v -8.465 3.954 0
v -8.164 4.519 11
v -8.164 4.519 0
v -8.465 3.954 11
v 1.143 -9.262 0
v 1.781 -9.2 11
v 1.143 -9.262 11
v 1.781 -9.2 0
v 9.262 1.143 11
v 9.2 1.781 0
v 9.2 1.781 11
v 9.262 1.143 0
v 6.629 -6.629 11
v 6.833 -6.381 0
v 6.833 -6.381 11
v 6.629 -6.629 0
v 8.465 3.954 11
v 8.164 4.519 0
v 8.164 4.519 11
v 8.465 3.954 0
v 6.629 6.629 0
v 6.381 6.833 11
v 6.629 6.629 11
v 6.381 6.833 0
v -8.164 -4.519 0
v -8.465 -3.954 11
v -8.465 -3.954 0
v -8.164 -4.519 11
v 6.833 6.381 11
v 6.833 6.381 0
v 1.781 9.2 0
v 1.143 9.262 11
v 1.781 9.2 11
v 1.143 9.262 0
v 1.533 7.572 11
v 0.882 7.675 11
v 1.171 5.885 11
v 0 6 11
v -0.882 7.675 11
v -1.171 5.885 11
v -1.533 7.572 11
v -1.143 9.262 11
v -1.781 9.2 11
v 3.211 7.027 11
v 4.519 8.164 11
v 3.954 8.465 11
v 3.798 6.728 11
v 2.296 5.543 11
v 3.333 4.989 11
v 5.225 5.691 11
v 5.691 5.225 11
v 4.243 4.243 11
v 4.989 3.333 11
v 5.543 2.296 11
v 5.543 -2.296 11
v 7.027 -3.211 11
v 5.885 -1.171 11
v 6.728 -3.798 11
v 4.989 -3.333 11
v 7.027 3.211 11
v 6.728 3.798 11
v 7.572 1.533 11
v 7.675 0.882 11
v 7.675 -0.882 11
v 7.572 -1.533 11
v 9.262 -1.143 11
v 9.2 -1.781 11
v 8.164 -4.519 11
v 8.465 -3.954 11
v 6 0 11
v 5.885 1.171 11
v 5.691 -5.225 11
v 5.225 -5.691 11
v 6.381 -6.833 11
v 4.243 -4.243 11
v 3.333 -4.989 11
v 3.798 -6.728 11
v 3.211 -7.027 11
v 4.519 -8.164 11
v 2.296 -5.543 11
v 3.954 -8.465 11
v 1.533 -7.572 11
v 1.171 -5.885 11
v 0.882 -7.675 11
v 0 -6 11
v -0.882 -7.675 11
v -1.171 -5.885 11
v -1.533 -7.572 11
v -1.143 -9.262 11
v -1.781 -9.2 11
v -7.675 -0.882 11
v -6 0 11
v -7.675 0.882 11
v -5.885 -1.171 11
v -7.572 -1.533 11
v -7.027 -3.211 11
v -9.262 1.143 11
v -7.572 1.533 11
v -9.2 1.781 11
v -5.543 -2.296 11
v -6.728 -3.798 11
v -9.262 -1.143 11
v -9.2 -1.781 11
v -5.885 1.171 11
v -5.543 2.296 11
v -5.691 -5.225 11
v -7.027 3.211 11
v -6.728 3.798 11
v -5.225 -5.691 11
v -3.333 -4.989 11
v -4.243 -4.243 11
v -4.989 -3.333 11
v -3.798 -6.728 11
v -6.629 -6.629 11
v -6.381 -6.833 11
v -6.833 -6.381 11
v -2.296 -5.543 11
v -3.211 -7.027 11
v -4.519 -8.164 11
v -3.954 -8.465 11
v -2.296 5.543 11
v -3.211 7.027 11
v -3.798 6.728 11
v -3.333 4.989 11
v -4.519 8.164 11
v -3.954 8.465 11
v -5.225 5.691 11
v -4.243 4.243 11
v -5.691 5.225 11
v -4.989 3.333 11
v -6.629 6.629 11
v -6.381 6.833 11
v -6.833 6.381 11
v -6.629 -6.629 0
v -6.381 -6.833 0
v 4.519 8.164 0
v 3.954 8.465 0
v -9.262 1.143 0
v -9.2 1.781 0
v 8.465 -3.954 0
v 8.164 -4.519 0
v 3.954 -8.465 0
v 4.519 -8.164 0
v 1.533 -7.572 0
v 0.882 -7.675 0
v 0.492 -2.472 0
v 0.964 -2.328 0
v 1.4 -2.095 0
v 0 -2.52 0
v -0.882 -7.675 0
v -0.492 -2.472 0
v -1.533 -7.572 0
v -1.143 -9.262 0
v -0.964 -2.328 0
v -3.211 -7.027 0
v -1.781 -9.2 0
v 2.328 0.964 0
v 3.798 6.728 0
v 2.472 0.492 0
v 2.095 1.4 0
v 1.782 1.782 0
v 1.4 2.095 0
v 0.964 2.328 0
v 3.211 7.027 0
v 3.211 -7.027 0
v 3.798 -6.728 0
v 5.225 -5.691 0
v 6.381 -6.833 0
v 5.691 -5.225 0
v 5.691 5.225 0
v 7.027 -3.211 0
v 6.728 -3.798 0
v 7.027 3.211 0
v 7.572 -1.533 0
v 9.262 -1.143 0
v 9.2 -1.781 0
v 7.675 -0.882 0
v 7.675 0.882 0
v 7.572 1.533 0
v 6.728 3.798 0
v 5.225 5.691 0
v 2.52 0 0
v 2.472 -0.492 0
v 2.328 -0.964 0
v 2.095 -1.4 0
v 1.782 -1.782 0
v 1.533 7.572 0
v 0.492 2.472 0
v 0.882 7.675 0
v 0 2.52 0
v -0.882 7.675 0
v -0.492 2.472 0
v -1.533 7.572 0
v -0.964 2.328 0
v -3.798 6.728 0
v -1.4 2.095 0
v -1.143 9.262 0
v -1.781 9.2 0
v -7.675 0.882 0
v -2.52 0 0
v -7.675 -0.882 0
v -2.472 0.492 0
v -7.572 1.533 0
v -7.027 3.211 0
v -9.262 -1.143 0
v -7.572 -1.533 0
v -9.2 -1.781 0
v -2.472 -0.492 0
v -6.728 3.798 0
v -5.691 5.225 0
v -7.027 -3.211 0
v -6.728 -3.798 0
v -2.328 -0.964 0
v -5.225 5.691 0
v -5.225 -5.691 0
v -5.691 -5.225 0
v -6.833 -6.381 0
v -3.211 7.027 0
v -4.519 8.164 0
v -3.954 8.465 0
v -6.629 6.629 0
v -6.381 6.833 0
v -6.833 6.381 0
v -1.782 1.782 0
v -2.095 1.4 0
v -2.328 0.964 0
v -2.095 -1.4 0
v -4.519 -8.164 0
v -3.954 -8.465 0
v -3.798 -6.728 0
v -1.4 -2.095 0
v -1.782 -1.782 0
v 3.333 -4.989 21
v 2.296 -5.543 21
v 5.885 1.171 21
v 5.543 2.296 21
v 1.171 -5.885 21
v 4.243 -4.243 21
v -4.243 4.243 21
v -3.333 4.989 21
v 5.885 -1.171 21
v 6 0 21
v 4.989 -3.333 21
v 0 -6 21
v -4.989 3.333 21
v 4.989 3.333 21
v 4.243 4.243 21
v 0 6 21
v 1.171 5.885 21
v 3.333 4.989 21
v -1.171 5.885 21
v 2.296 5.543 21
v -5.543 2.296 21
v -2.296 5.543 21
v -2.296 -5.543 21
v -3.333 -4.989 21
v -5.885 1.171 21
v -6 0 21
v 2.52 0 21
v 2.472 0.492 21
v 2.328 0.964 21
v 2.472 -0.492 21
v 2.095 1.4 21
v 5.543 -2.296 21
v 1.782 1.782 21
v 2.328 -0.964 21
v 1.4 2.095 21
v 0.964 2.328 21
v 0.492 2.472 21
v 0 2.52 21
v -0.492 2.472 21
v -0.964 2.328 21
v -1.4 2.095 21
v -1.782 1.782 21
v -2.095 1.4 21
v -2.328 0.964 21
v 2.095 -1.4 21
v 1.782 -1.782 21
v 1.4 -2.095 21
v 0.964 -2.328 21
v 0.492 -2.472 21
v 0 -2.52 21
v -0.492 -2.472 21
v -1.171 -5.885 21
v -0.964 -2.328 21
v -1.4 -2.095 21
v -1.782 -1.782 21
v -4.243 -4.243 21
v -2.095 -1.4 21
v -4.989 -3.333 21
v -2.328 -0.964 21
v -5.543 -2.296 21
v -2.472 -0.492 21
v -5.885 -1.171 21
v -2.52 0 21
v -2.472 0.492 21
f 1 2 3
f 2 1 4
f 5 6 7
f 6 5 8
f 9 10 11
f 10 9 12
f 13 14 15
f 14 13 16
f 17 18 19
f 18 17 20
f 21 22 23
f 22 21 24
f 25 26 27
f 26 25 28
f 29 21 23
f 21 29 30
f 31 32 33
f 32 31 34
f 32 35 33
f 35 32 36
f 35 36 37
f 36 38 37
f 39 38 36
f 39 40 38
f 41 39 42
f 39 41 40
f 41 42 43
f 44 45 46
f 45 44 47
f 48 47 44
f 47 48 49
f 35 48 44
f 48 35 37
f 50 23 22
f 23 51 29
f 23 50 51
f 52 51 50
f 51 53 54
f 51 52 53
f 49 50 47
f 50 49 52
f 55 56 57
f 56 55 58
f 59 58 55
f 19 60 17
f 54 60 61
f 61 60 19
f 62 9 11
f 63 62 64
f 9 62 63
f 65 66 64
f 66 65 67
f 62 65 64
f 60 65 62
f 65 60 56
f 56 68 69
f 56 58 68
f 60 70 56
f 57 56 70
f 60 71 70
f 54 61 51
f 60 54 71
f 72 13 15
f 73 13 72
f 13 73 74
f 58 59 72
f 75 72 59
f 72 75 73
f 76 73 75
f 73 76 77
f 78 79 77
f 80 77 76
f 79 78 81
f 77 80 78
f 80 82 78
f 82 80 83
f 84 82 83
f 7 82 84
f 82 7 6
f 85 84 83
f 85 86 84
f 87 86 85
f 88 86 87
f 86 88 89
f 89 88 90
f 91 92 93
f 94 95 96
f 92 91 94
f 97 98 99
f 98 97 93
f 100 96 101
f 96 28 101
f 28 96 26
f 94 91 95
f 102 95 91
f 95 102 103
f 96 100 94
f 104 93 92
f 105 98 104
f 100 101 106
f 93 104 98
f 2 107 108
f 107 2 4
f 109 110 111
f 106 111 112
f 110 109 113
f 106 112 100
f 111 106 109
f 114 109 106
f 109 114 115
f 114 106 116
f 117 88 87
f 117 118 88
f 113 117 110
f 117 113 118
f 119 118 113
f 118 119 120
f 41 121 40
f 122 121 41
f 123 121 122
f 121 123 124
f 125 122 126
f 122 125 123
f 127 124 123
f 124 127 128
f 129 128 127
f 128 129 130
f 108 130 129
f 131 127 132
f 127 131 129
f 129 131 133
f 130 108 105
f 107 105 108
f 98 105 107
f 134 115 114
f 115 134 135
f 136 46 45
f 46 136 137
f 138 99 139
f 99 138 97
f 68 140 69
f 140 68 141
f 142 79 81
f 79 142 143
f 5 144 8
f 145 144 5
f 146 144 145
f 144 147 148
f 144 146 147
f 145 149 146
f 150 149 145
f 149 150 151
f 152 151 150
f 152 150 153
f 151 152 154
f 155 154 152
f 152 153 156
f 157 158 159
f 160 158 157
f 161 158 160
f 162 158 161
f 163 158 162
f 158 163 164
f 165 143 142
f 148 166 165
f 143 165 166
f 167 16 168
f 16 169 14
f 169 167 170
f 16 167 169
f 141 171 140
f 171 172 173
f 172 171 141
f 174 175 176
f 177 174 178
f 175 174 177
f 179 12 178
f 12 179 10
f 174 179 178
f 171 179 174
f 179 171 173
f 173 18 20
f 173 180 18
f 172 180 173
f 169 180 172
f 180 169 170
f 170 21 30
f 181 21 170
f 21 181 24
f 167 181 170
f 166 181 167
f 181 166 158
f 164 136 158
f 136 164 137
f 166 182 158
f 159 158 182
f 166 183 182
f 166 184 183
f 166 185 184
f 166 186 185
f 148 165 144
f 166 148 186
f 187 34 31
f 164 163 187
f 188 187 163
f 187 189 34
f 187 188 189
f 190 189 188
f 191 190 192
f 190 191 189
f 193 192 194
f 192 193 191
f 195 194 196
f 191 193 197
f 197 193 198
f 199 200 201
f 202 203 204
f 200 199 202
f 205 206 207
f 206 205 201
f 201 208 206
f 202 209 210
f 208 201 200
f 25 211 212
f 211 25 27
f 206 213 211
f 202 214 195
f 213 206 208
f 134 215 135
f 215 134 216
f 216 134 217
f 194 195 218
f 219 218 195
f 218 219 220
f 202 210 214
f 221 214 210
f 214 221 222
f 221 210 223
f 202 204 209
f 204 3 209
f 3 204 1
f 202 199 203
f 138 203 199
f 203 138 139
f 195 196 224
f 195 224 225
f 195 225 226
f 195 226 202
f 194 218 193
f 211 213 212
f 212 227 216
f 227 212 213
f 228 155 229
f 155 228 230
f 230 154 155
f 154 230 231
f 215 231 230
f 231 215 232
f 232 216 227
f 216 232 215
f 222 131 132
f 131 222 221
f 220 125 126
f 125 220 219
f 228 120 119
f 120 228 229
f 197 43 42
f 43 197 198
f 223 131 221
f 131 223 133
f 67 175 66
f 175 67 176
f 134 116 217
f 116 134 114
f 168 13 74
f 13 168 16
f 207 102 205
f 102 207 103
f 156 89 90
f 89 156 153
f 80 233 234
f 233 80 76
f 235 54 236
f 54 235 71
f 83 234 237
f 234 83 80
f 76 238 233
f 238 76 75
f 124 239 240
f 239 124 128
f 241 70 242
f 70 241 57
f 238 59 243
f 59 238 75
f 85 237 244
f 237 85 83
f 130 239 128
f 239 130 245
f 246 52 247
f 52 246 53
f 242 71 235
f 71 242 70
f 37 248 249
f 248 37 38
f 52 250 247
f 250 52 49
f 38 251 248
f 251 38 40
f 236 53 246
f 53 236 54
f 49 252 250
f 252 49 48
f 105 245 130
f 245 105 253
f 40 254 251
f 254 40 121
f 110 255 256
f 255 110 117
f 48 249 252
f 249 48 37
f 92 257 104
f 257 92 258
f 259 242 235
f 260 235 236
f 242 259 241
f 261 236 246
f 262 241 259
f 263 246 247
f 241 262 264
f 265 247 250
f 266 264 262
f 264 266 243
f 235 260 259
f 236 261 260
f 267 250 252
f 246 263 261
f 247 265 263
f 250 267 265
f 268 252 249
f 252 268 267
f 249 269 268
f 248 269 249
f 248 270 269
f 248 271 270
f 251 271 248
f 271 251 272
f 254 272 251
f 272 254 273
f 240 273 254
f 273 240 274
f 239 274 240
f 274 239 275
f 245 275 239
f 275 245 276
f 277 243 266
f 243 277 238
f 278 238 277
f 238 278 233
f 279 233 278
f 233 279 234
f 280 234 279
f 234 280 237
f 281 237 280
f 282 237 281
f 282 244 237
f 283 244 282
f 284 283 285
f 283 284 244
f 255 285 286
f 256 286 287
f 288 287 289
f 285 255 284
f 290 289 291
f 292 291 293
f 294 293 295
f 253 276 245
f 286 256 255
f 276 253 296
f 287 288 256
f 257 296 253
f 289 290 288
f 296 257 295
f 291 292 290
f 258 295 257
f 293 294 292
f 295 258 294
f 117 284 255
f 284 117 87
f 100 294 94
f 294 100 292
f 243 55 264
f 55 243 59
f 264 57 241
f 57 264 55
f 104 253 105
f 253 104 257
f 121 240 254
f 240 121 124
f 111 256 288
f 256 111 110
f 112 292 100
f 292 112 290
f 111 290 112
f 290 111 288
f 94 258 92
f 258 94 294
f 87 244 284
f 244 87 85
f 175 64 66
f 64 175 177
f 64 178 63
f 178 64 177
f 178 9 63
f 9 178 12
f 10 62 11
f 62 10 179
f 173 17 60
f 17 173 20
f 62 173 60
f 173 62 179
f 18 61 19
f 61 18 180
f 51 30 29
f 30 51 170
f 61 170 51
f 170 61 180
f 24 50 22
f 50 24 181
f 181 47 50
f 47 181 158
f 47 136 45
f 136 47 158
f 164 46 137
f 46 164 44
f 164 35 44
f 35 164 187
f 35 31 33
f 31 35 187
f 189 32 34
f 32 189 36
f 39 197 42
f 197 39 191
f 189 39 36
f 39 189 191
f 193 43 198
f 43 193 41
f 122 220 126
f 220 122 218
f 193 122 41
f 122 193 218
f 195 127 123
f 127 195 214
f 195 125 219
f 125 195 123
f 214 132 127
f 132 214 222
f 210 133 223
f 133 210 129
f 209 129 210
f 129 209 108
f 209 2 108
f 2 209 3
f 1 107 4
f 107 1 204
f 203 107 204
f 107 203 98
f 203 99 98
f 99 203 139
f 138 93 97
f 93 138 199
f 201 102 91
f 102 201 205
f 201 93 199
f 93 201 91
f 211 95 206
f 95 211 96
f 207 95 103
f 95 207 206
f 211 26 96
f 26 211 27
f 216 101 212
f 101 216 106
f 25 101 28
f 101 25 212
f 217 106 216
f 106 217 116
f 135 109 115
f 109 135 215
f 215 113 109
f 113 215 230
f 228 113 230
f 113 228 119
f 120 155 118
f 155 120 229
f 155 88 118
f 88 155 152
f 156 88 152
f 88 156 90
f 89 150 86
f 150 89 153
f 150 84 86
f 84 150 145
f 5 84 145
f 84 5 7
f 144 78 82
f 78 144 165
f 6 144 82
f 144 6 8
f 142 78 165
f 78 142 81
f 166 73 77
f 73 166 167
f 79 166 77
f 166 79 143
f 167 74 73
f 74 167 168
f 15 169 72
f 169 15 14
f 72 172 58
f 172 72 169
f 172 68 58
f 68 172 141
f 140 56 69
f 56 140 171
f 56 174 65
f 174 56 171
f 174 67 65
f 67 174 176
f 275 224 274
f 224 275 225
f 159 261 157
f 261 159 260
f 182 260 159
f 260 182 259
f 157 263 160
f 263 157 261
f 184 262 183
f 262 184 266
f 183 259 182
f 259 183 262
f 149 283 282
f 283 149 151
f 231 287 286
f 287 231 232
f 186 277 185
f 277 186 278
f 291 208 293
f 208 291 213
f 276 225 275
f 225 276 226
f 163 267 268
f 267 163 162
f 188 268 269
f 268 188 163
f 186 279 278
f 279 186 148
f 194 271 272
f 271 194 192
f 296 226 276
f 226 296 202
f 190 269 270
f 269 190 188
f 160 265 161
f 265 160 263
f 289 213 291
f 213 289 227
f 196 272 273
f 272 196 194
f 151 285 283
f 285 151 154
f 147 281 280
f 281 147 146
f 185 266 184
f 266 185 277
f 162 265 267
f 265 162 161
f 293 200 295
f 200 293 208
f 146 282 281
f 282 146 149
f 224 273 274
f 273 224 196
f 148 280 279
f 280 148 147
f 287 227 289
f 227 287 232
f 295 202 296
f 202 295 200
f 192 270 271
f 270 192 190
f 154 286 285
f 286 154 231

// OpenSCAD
$fn = 32;

// ----------------------------------------------------------------------
// Timing pulley: GT3 20T, pitch 3 mm, 18.75 mm x 21 mm
// ----------------------------------------------------------------------

// --- parameters (mm) ---
belt_pitch = 3;           // belt pitch
n_teeth = 20;             // number of grooves
rim_w = 11;               // belt width between the flanges
tip_d = 18.75;            // tip circle diameter
root_d = 16.55;           // groove bottom diameter
groove_h = 1.1;           // groove depth
tooth_w = 2.1;            // groove width at the tip circle
shaft_d = 5.04;           // shaft bore
hub_d = 12;               // hub diameter
hub_h = 10;               // hub above the flange
bottom_z = 0;             // lowest point of the pulley
top_z = 21;               // highest point of the pulley

module rim() {
  cylinder(h = rim_w, d = tip_d);
}

module groove_cutter() {
  /* belt tooth groove: deeper than wide, cut through the belt width */
  translate([root_d / 2, 0, 0])
    linear_extrude(height = rim_w)
      polygon(points = [[-0.6, -tooth_w * 0.42], [groove_h + 0.6, -tooth_w * 0.6],
                        [groove_h + 0.6, tooth_w * 0.6], [-0.6, tooth_w * 0.42]]);
}

module hub() {
  translate([0, 0, bottom_z]) cylinder(h = top_z - bottom_z, d = hub_d);
}

difference() {
  union() {
    rim();
    hub();
  }
  for (i = [0 : n_teeth - 1]) rotate([0, 0, i * 360 / n_teeth]) groove_cutter();
  translate([0, 0, bottom_z - 1]) cylinder(h = top_z - bottom_z + 2, d = shaft_d);
}
